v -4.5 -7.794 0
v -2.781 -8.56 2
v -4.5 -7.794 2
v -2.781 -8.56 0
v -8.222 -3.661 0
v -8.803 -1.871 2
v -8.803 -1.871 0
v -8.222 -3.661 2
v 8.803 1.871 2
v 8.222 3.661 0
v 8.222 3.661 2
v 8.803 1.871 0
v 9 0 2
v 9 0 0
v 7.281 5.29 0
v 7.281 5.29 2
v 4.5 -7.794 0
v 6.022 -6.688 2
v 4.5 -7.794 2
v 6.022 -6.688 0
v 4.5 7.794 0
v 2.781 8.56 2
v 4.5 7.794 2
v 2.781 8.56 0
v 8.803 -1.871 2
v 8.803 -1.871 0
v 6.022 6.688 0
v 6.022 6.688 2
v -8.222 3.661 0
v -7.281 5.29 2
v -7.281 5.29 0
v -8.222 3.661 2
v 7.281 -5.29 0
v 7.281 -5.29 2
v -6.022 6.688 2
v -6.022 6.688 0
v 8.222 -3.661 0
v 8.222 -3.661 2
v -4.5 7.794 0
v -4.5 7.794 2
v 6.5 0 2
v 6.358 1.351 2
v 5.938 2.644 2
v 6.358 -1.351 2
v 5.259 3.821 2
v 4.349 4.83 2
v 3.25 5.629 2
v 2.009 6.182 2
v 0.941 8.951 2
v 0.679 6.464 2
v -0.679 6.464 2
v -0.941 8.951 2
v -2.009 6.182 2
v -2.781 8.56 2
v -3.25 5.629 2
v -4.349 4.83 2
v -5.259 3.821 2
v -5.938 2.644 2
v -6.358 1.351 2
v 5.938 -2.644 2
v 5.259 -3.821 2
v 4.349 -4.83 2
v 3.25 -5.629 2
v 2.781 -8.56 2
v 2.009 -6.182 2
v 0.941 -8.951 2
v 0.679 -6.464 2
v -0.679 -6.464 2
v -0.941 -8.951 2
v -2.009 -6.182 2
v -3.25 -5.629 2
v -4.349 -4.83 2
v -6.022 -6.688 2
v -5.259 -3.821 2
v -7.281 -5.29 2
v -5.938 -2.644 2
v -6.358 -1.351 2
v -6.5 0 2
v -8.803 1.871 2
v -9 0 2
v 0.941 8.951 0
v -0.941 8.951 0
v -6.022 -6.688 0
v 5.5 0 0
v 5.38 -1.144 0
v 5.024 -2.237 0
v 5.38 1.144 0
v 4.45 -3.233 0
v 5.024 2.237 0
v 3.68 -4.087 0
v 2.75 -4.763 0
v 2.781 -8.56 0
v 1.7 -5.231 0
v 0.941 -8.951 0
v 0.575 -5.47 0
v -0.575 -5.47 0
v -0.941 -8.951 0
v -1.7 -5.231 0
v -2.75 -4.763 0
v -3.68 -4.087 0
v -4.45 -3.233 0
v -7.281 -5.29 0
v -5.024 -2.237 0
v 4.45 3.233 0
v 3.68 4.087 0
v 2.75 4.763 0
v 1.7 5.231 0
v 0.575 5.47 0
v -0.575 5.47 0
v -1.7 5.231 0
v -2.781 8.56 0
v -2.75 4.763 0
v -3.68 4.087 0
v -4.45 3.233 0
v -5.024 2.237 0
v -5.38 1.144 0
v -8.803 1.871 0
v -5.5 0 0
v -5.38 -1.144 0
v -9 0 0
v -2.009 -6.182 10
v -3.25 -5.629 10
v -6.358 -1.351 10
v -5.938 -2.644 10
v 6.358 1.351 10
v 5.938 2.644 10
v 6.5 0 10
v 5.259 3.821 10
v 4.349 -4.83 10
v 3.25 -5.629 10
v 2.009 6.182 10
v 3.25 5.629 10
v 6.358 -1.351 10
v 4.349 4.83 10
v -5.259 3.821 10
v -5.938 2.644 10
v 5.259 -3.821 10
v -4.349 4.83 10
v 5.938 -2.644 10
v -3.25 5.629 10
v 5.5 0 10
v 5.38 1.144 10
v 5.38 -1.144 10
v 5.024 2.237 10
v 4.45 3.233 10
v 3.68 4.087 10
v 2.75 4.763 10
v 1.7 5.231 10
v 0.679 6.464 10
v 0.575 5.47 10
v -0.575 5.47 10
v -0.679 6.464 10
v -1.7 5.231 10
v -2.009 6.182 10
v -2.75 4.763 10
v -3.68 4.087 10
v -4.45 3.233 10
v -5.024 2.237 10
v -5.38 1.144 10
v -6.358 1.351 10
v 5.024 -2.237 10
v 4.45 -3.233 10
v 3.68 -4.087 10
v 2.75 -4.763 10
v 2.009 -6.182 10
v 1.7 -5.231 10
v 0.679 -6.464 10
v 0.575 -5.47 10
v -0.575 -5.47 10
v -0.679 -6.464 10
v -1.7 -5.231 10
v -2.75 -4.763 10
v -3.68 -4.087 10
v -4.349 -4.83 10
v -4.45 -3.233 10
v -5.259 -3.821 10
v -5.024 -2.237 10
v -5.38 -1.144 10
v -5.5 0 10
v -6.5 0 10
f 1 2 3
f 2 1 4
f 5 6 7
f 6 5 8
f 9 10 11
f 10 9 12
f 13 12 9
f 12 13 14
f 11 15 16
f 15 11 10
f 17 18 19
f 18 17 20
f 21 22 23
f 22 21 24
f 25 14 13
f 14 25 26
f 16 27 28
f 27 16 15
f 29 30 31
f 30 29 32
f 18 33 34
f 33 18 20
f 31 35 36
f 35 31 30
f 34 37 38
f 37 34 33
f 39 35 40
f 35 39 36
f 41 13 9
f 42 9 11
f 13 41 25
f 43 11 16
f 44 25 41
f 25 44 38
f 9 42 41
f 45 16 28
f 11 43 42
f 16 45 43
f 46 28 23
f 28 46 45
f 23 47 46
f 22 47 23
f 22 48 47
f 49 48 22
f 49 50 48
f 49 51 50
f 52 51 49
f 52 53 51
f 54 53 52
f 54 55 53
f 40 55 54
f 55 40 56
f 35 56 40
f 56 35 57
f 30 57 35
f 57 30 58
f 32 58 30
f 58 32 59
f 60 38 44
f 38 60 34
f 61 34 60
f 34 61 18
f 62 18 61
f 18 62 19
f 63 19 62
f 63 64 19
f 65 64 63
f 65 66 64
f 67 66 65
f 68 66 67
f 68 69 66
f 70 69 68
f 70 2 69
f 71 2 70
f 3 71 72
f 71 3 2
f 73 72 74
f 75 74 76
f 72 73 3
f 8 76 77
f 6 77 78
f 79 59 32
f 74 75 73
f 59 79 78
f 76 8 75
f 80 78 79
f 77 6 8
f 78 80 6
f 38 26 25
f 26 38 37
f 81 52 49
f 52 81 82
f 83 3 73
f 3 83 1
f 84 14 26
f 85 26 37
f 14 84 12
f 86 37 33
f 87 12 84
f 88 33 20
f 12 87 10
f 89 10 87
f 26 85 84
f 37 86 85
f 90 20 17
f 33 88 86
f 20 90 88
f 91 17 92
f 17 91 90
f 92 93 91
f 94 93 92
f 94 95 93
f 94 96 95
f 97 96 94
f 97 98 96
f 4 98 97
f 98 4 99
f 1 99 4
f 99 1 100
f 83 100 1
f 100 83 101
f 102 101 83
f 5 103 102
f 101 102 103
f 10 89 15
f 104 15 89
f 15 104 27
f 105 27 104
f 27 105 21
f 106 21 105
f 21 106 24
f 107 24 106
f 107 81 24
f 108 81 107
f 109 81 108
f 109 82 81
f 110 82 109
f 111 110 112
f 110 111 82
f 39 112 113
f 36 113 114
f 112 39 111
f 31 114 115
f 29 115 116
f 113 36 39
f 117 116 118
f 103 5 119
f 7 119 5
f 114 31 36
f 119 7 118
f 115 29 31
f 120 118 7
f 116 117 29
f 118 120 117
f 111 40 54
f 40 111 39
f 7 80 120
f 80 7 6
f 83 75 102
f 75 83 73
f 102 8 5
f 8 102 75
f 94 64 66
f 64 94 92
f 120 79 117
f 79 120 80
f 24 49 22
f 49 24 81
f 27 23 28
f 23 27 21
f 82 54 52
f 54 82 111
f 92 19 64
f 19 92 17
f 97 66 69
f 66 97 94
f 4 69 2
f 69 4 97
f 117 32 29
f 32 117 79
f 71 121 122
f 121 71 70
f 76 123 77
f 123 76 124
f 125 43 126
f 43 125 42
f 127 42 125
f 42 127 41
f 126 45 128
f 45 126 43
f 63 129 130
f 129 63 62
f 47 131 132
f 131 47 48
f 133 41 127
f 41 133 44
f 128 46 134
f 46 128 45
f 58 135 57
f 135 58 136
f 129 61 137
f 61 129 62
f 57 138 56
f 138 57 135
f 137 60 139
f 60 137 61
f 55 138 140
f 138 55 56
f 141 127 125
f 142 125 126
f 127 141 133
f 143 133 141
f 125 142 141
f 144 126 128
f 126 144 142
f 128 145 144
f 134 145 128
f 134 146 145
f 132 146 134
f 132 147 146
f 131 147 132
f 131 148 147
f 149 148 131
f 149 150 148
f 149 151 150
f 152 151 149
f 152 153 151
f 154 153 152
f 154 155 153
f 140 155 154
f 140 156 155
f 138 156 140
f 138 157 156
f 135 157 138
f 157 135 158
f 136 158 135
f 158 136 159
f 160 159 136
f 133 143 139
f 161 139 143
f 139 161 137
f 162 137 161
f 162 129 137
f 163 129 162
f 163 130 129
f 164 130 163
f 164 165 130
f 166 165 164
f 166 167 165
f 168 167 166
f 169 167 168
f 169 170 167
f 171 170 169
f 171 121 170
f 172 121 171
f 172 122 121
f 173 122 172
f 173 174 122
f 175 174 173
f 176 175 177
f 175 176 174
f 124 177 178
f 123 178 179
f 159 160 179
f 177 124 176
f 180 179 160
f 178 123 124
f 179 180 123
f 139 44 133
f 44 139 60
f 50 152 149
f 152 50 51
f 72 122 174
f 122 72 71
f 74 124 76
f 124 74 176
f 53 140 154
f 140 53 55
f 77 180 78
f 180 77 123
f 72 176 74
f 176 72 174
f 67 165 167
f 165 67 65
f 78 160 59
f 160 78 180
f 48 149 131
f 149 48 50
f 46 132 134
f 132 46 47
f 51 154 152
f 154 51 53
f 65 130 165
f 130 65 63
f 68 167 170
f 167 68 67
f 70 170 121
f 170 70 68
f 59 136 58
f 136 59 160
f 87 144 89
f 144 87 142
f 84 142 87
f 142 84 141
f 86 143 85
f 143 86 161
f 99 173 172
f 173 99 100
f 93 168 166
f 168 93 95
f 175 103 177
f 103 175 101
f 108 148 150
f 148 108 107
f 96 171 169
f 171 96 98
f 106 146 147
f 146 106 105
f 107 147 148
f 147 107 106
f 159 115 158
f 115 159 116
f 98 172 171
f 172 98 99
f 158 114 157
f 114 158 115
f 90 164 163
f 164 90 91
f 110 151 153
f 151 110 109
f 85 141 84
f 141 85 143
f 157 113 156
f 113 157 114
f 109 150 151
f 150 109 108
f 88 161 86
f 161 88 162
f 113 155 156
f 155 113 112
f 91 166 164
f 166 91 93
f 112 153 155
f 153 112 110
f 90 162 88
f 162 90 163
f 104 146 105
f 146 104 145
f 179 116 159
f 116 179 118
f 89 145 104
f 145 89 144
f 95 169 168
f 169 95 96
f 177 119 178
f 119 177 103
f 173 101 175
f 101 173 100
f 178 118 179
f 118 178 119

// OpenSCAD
BNC_DIA = 11;
GROMMET_DIA = 13;
GROMMET_LENGTH = 10;
FLANGE_DIA = 18;
FLANGE_THICKNESS = 2;

$fn = 30;

difference() {
  union() {
    cylinder(d = FLANGE_DIA, h = FLANGE_THICKNESS);
    cylinder(d = GROMMET_DIA, h = GROMMET_LENGTH);
  }

  cylinder(d = BNC_DIA, h = GROMMET_LENGTH);
}
